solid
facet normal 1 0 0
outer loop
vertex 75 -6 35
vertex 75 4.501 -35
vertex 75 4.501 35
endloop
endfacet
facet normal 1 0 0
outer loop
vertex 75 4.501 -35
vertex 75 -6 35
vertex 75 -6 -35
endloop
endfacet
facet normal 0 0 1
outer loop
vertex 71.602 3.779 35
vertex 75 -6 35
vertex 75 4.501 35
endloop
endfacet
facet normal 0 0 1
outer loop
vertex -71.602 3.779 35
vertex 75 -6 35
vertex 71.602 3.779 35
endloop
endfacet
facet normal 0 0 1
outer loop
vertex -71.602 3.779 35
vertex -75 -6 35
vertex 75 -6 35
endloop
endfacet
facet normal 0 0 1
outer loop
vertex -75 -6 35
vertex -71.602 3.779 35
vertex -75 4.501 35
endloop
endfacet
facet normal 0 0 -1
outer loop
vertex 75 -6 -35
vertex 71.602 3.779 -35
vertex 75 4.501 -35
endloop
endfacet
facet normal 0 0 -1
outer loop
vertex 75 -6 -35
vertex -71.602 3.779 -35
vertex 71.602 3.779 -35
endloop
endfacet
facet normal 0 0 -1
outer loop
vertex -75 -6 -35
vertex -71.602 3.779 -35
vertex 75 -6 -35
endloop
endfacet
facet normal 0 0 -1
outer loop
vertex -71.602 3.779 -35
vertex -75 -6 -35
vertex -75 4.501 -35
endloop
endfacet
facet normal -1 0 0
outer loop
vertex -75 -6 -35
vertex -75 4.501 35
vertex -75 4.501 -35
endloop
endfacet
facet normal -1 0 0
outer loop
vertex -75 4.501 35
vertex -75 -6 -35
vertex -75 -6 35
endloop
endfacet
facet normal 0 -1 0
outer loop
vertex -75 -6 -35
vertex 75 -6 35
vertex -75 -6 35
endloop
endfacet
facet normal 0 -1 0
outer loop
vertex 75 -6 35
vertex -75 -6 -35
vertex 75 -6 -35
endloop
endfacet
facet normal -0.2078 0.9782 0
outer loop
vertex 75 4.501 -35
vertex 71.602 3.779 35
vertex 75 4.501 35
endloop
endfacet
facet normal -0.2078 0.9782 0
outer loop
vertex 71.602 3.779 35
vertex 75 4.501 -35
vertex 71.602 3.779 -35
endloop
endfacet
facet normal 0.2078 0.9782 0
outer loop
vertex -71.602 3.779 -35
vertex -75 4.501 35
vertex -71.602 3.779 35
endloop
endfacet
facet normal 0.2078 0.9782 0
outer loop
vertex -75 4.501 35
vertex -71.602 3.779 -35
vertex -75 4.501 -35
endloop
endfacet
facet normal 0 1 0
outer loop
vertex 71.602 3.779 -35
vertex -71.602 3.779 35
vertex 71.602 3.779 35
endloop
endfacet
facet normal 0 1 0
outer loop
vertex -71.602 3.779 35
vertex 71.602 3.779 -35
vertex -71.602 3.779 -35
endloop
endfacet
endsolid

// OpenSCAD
width = 150;
depth = 12;
height = 70;
R = 685;

r = (R^2 + (depth/2)^2)^(1/2);
echo("r=", r);

difference()
{
    cube([width, depth, height], true);
    translate([0, r, 0]){
        cylinder(height, R, R, true);
    }
}
